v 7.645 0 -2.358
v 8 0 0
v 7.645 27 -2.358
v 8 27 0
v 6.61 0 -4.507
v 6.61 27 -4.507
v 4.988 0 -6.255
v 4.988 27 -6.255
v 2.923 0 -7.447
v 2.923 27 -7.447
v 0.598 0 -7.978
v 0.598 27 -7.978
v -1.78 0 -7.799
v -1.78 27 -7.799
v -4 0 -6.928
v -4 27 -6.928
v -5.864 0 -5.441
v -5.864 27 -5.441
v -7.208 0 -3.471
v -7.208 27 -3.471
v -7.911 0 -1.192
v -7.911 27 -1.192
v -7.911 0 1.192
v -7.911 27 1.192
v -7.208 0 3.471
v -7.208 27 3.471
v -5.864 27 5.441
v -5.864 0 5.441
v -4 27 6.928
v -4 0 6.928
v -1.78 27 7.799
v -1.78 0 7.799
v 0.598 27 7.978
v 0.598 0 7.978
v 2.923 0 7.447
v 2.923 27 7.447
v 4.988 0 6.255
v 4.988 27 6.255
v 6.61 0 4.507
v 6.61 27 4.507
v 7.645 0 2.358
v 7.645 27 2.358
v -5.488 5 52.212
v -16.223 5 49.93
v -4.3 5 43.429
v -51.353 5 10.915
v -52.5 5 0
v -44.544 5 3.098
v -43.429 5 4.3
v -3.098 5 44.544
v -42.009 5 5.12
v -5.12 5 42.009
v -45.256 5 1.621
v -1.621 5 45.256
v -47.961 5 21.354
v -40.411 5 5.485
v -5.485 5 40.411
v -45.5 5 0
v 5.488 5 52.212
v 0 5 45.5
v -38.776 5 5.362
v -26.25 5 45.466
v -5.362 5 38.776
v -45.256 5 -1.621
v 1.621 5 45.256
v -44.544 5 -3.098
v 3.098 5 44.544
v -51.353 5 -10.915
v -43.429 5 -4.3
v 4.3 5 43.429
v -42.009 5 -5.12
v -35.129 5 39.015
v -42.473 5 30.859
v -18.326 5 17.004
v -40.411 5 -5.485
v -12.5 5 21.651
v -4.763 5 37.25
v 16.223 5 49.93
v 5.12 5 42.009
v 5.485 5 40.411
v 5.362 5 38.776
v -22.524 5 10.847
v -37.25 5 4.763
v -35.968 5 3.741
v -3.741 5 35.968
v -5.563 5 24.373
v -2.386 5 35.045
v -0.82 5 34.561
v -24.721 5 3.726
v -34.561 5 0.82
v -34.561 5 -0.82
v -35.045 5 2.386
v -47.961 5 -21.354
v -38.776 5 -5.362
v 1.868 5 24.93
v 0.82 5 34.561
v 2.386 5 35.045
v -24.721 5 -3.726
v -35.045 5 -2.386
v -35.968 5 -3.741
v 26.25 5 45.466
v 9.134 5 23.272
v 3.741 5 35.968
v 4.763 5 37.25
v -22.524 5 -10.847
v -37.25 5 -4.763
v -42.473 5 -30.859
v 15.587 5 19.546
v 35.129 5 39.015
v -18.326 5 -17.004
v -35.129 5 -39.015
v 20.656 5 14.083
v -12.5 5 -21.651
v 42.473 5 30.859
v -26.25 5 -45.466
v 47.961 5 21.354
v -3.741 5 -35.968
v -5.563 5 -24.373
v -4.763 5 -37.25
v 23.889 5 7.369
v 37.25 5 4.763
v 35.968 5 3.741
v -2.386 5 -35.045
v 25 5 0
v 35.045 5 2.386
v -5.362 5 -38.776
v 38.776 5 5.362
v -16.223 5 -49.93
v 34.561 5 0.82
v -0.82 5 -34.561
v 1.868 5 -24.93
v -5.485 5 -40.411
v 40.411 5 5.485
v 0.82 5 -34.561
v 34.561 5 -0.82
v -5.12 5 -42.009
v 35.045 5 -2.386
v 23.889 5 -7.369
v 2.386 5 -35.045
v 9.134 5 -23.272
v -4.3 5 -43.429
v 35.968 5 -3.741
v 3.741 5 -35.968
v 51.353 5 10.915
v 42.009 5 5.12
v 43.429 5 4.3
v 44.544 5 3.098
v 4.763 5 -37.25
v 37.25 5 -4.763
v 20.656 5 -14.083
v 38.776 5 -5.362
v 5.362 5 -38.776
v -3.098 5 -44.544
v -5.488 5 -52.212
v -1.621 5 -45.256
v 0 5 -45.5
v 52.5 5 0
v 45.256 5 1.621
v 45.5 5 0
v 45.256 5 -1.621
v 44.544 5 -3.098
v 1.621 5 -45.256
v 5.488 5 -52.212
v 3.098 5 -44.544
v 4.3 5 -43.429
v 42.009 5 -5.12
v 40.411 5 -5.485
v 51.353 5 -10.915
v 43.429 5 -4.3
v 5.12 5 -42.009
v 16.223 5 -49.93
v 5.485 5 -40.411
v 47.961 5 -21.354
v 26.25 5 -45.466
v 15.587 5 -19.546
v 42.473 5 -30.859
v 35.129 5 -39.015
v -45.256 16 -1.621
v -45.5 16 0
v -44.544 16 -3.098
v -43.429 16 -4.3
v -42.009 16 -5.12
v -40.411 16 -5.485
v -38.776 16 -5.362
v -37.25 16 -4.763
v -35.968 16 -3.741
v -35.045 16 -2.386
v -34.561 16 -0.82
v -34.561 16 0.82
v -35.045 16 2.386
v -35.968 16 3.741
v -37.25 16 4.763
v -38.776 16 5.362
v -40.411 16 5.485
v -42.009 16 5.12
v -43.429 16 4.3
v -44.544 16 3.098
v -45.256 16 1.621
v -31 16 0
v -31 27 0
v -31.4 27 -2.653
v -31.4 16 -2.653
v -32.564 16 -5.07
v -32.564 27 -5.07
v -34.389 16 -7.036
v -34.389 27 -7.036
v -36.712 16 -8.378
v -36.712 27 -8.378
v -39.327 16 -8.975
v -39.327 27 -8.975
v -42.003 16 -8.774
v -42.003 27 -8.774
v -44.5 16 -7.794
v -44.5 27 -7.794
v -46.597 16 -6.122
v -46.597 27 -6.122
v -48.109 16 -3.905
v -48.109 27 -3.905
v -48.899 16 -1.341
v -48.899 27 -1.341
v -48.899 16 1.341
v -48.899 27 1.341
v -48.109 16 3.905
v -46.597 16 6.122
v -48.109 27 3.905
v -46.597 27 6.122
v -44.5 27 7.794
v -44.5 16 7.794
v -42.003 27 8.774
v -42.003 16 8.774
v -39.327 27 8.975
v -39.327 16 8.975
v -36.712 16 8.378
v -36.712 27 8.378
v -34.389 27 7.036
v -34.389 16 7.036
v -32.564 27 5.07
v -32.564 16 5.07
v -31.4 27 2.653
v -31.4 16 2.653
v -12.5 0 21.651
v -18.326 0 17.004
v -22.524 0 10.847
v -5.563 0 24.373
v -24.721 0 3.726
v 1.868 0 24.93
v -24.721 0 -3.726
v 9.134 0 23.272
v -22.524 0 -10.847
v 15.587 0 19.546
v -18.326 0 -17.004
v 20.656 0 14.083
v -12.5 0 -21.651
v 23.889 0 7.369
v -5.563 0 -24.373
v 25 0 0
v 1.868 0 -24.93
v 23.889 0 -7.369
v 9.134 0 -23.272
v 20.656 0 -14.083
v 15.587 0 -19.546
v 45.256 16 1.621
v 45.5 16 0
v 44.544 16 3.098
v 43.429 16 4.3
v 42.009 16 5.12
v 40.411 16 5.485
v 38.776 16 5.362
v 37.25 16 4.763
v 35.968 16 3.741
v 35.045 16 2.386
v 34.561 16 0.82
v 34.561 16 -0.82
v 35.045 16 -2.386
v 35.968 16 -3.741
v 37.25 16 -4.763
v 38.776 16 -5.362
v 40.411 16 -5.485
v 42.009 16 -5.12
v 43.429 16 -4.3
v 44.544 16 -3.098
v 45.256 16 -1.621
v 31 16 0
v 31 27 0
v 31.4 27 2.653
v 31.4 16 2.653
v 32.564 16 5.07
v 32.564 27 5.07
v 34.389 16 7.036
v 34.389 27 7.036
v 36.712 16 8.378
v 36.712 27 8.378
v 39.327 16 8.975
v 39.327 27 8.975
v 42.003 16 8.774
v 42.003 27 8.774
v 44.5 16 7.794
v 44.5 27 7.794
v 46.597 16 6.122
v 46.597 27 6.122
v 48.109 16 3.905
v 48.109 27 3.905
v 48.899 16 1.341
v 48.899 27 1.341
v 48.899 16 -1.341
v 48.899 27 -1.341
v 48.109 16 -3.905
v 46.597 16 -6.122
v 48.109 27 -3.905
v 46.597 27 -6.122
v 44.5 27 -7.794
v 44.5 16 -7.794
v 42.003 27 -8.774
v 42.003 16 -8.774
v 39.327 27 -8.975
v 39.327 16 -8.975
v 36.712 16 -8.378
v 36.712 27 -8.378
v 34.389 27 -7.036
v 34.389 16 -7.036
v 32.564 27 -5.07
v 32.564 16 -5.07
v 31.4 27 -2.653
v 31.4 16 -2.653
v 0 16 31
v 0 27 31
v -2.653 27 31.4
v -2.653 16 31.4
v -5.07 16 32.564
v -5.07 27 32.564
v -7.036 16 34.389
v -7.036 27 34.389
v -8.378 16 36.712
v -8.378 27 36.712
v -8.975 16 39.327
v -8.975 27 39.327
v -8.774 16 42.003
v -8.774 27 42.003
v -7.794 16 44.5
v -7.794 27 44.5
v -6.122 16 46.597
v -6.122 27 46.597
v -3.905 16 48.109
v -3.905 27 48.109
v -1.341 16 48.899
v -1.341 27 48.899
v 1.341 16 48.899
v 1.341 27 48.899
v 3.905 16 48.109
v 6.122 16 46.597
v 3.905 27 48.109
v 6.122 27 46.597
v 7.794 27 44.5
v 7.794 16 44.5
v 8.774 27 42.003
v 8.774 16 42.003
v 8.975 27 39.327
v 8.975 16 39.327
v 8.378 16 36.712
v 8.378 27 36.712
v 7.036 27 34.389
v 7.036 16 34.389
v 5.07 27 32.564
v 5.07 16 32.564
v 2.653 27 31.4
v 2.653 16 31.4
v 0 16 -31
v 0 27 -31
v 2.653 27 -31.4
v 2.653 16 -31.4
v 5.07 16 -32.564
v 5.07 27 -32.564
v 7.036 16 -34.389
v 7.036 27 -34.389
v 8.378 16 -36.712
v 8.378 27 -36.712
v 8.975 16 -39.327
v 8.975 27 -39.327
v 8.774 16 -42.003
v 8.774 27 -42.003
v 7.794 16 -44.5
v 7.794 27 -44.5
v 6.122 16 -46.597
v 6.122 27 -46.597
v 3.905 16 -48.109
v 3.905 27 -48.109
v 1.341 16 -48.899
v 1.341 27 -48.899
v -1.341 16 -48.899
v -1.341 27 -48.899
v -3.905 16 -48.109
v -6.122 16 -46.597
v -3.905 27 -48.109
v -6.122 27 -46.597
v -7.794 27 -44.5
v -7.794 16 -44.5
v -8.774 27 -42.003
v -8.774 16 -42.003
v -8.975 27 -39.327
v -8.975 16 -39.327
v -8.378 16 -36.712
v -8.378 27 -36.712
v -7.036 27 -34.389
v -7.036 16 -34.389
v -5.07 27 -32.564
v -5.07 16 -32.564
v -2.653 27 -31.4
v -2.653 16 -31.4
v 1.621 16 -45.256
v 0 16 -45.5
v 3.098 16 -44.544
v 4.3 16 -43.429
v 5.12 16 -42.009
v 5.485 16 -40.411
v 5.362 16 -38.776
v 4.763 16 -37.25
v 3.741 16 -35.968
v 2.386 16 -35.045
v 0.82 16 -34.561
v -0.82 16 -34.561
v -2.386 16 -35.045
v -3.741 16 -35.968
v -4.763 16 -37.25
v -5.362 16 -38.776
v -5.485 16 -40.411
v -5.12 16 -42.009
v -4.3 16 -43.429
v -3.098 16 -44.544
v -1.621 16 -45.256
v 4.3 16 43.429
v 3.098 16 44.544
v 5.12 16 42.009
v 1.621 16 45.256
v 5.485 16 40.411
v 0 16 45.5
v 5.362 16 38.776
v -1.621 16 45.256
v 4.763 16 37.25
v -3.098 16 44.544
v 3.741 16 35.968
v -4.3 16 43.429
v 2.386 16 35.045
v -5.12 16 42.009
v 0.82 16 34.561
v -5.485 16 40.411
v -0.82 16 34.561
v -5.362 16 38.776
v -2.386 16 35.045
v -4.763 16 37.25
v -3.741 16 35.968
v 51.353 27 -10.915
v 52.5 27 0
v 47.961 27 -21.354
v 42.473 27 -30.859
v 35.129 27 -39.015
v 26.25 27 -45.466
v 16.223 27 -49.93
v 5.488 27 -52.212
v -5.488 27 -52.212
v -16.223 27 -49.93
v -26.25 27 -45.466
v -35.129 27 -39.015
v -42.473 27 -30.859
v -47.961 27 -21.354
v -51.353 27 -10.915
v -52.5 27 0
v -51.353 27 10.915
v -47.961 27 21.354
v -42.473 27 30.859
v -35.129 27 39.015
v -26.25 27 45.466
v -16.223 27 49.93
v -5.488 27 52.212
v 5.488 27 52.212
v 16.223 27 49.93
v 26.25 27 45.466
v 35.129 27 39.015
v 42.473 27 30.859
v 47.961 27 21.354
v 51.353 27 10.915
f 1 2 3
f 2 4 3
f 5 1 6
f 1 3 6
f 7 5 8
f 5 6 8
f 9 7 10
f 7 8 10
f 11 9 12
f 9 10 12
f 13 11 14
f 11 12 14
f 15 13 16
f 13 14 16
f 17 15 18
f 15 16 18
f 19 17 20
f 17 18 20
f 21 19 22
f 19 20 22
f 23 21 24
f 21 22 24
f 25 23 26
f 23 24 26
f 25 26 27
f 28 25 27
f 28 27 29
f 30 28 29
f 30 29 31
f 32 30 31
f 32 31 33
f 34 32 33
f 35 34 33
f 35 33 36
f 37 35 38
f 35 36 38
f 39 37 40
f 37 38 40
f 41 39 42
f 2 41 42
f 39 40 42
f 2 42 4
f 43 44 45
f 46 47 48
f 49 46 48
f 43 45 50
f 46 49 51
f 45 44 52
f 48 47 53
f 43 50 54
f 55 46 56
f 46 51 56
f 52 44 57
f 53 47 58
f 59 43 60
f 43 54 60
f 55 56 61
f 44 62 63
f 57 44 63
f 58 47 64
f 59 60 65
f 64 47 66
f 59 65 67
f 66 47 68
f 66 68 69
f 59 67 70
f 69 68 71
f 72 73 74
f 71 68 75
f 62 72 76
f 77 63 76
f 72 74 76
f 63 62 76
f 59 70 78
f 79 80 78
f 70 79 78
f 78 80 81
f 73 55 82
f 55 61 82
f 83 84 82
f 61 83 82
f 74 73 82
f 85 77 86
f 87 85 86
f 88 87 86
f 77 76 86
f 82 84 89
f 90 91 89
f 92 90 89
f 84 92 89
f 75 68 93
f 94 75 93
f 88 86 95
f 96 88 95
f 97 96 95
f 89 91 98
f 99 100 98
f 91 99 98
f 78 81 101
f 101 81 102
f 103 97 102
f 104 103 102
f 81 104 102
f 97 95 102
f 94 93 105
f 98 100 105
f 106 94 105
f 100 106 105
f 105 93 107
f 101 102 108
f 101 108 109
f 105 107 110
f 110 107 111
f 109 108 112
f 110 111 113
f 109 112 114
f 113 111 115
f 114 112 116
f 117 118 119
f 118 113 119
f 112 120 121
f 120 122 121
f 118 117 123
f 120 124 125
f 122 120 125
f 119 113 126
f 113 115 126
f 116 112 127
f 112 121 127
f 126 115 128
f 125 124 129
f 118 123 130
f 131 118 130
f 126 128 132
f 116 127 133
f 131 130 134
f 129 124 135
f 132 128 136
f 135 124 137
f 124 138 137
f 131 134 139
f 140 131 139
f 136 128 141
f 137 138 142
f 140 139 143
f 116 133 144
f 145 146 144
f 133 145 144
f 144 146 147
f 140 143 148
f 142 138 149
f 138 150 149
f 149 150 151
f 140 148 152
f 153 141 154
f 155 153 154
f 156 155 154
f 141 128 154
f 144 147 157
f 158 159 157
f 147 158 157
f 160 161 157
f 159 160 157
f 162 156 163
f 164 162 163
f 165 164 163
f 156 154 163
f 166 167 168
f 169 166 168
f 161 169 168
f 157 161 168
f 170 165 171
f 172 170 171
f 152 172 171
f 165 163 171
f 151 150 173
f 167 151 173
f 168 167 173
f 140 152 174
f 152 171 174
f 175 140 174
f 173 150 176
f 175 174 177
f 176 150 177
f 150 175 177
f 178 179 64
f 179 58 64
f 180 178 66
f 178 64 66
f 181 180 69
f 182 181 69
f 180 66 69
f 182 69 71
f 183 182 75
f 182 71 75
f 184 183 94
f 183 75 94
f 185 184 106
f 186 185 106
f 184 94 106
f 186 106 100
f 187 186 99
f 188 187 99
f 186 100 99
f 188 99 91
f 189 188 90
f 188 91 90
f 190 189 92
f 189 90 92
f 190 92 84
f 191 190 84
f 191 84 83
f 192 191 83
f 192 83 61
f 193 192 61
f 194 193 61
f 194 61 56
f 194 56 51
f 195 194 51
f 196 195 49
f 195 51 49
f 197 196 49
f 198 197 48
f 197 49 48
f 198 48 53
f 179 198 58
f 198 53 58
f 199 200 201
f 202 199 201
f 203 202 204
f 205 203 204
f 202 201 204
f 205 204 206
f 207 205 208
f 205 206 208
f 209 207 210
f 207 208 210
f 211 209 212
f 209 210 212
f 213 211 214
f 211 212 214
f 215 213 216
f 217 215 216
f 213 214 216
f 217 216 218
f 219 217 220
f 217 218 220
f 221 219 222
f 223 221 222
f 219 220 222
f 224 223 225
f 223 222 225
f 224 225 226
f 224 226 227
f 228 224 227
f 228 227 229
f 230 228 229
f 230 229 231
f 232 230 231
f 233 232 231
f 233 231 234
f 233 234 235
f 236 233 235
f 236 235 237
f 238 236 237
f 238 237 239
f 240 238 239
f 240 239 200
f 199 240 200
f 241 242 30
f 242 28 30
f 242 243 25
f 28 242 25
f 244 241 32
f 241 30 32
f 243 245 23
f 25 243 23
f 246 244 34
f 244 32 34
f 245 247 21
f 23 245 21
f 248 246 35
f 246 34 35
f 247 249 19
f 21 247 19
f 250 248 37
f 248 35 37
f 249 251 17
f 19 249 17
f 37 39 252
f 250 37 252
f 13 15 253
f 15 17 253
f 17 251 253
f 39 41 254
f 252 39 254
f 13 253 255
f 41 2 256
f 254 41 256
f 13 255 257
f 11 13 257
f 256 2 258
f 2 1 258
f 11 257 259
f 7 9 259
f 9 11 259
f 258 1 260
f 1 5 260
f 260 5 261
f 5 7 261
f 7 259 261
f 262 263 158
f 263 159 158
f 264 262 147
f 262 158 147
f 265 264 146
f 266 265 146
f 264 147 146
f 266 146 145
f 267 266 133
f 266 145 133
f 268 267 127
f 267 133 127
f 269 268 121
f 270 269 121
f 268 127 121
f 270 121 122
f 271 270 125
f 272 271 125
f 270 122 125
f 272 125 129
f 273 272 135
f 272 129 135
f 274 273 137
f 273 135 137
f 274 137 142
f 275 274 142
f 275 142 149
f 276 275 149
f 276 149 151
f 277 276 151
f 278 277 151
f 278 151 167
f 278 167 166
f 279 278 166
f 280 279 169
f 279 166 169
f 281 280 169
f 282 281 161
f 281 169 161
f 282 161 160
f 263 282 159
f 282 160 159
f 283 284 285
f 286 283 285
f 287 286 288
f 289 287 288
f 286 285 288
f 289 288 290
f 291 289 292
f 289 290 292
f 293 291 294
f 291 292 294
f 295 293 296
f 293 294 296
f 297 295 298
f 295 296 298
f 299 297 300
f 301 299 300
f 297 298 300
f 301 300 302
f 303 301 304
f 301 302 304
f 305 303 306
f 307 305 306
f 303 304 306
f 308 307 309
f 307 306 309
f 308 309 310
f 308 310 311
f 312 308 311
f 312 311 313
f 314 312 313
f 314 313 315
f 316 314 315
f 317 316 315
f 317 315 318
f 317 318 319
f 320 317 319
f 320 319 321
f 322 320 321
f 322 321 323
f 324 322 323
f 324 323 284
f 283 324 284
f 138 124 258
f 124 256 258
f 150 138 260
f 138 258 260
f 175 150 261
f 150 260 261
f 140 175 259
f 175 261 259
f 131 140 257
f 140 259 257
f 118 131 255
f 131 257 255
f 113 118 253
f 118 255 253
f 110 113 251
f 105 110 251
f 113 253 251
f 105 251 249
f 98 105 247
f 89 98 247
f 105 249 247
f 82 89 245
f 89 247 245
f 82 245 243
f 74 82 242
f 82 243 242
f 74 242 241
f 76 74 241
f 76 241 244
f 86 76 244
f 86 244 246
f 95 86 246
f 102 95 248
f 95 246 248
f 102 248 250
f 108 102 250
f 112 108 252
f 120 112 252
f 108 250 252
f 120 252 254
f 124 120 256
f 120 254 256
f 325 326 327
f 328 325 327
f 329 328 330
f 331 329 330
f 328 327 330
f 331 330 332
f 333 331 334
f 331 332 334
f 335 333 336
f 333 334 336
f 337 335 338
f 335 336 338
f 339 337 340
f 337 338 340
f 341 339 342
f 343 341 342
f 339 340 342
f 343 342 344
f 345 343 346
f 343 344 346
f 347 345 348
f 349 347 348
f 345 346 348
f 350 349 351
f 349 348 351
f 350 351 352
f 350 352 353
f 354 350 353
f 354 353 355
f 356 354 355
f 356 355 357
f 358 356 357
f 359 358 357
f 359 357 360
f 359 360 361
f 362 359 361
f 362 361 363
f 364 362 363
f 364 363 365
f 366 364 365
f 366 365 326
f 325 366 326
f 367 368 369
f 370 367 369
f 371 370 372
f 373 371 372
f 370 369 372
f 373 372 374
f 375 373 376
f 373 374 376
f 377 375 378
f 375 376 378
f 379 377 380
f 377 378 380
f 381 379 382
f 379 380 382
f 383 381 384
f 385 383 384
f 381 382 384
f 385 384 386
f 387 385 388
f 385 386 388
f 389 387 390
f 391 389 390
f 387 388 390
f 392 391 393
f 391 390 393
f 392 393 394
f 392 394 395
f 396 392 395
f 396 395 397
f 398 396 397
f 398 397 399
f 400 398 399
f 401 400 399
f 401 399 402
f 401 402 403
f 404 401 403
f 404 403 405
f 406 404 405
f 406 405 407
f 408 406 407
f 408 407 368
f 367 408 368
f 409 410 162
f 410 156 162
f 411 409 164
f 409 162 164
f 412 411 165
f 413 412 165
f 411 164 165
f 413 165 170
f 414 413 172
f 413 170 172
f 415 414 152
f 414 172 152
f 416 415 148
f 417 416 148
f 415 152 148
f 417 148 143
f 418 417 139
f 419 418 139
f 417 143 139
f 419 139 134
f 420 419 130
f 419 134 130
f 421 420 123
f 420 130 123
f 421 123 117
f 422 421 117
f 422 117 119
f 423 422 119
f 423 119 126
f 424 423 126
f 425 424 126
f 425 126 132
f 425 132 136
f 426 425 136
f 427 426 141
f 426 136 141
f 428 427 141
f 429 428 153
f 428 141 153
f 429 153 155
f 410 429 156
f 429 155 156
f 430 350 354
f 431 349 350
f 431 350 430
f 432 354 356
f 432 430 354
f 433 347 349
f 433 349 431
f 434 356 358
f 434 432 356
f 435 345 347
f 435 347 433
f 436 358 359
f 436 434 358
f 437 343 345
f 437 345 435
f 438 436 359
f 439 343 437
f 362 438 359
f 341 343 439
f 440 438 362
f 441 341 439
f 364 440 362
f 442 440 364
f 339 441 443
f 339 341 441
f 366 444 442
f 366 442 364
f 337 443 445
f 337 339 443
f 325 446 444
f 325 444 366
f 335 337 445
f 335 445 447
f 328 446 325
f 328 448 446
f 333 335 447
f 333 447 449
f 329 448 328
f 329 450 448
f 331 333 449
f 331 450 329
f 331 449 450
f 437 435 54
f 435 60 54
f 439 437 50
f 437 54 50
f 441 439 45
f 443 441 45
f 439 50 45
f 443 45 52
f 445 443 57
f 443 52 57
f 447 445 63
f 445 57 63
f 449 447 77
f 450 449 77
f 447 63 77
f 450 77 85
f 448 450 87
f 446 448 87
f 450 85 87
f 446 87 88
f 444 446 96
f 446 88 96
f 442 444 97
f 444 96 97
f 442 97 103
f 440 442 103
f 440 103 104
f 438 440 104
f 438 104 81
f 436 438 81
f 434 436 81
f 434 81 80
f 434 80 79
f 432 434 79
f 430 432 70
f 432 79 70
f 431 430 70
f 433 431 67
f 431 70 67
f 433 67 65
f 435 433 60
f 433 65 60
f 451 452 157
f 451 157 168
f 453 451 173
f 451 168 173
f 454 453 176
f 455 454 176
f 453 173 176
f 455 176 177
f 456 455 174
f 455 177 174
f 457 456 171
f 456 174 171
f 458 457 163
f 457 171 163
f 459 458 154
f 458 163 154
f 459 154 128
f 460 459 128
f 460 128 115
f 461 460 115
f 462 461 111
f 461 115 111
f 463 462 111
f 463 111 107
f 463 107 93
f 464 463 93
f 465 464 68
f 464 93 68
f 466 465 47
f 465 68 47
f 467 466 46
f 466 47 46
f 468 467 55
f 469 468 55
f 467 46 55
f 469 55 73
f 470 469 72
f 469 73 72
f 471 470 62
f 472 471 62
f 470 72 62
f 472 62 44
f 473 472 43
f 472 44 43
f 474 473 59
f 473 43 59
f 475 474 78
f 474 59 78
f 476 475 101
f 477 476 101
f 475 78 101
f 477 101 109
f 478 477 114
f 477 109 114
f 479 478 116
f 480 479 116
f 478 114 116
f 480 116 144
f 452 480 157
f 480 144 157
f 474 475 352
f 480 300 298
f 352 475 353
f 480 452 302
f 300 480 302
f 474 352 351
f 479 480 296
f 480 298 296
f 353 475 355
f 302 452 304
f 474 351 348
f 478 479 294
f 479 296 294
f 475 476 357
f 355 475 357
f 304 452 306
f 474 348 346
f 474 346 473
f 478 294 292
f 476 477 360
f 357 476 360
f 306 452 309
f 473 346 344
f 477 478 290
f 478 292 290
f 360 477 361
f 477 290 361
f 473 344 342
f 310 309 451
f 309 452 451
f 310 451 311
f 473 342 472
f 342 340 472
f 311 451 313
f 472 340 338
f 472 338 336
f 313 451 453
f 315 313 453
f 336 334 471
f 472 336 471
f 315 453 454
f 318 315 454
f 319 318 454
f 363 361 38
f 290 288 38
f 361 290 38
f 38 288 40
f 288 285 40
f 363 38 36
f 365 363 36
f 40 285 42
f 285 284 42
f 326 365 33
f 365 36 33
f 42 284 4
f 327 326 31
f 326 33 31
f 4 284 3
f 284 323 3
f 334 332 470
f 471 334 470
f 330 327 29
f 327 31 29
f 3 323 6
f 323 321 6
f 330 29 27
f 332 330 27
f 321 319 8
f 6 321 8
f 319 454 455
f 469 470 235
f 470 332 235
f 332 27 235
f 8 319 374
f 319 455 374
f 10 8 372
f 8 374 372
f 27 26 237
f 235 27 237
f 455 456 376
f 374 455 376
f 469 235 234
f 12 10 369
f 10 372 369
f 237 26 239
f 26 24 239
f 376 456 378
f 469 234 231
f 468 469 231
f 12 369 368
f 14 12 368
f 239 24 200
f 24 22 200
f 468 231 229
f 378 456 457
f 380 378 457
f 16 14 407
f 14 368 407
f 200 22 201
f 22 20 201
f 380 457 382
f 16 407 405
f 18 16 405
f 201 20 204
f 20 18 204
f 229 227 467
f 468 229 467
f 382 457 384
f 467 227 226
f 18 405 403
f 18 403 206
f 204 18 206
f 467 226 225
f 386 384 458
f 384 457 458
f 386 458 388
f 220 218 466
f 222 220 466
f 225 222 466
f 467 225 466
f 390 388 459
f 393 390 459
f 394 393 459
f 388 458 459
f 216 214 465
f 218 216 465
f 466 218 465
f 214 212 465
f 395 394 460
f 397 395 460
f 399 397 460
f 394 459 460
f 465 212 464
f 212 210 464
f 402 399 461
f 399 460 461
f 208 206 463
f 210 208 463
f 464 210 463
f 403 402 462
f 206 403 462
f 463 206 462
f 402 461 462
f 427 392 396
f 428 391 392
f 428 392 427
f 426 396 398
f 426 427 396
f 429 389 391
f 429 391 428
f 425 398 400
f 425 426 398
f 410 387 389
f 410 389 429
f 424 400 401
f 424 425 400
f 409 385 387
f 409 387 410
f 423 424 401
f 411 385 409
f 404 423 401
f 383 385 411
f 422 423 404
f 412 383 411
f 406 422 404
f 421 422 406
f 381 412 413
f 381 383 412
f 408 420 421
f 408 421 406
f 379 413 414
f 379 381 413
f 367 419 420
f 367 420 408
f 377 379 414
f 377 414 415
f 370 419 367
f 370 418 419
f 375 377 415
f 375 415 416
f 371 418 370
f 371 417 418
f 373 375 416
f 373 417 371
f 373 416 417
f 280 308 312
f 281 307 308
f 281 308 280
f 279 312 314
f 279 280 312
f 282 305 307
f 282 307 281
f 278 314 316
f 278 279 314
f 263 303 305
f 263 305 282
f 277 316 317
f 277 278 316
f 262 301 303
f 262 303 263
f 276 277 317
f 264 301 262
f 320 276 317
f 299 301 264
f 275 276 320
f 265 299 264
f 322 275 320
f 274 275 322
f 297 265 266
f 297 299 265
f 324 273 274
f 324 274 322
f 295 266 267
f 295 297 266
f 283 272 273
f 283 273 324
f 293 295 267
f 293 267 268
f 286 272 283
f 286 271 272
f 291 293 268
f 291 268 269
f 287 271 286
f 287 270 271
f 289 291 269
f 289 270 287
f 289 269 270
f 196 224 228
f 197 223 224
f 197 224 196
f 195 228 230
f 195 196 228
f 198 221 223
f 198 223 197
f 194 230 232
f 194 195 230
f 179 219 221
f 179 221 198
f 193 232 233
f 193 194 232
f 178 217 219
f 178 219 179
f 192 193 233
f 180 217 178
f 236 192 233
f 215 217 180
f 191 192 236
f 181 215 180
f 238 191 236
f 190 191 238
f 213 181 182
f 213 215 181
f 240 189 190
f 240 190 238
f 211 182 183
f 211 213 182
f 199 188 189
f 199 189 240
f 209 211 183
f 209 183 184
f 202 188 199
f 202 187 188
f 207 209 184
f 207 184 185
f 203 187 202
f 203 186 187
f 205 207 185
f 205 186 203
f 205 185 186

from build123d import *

# Parameters (mm, degrees)
CHAMBRAGE_POUR_VIS_T_TE_CYLINDRIQUE_D           = 11
CHAMBRAGE_POUR_VIS_T_TE_CYLINDRIQUE_CBORE_D     = 18
CHAMBRAGE_POUR_VIS_T_TE_CYLINDRIQUE_CBORE_DEPTH = 11
R_P_TITION_CIRCULAIRE1_COUNT                    = 4


with BuildPart() as part:
    # Esquisse1 → Révolution1 (revolve)
    with BuildSketch(Plane.XY):
        Polygon((8, 0), (8, 27), (52.5, 27), (52.5, 5), (25, 5), (25, 0), align=None)
    revolve(axis=Axis((0, -750.927070457, 0), (0, 1, 0)))

    # Chambrage pour vis à tête cylindrique à 6 pans creux (ou vis CHC) M101 (through all)
    with Locations(Plane(origin=(0, 27, 0), x_dir=(1, 0, 0), z_dir=(0, 1, 0))):
        with Locations((-40, 0)):
            chambrage_pour_vis_t_te_cylindrique = CounterBoreHole(CHAMBRAGE_POUR_VIS_T_TE_CYLINDRIQUE_D / 2, CHAMBRAGE_POUR_VIS_T_TE_CYLINDRIQUE_CBORE_D / 2, CHAMBRAGE_POUR_VIS_T_TE_CYLINDRIQUE_CBORE_DEPTH)

    # Répétition circulaire1: Chambrage pour vis à tête cylindrique à 6 pans creux (ou vis CHC) M101 ×4 about axis
    r_p_tition_circulaire1_axis = Axis((0, 0, 0), (0, 1, 0))
    for i in range(1, R_P_TITION_CIRCULAIRE1_COUNT):
        add(chambrage_pour_vis_t_te_cylindrique.rotate(r_p_tition_circulaire1_axis, i * 360 / R_P_TITION_CIRCULAIRE1_COUNT), mode=Mode.SUBTRACT)


solid = part.part
